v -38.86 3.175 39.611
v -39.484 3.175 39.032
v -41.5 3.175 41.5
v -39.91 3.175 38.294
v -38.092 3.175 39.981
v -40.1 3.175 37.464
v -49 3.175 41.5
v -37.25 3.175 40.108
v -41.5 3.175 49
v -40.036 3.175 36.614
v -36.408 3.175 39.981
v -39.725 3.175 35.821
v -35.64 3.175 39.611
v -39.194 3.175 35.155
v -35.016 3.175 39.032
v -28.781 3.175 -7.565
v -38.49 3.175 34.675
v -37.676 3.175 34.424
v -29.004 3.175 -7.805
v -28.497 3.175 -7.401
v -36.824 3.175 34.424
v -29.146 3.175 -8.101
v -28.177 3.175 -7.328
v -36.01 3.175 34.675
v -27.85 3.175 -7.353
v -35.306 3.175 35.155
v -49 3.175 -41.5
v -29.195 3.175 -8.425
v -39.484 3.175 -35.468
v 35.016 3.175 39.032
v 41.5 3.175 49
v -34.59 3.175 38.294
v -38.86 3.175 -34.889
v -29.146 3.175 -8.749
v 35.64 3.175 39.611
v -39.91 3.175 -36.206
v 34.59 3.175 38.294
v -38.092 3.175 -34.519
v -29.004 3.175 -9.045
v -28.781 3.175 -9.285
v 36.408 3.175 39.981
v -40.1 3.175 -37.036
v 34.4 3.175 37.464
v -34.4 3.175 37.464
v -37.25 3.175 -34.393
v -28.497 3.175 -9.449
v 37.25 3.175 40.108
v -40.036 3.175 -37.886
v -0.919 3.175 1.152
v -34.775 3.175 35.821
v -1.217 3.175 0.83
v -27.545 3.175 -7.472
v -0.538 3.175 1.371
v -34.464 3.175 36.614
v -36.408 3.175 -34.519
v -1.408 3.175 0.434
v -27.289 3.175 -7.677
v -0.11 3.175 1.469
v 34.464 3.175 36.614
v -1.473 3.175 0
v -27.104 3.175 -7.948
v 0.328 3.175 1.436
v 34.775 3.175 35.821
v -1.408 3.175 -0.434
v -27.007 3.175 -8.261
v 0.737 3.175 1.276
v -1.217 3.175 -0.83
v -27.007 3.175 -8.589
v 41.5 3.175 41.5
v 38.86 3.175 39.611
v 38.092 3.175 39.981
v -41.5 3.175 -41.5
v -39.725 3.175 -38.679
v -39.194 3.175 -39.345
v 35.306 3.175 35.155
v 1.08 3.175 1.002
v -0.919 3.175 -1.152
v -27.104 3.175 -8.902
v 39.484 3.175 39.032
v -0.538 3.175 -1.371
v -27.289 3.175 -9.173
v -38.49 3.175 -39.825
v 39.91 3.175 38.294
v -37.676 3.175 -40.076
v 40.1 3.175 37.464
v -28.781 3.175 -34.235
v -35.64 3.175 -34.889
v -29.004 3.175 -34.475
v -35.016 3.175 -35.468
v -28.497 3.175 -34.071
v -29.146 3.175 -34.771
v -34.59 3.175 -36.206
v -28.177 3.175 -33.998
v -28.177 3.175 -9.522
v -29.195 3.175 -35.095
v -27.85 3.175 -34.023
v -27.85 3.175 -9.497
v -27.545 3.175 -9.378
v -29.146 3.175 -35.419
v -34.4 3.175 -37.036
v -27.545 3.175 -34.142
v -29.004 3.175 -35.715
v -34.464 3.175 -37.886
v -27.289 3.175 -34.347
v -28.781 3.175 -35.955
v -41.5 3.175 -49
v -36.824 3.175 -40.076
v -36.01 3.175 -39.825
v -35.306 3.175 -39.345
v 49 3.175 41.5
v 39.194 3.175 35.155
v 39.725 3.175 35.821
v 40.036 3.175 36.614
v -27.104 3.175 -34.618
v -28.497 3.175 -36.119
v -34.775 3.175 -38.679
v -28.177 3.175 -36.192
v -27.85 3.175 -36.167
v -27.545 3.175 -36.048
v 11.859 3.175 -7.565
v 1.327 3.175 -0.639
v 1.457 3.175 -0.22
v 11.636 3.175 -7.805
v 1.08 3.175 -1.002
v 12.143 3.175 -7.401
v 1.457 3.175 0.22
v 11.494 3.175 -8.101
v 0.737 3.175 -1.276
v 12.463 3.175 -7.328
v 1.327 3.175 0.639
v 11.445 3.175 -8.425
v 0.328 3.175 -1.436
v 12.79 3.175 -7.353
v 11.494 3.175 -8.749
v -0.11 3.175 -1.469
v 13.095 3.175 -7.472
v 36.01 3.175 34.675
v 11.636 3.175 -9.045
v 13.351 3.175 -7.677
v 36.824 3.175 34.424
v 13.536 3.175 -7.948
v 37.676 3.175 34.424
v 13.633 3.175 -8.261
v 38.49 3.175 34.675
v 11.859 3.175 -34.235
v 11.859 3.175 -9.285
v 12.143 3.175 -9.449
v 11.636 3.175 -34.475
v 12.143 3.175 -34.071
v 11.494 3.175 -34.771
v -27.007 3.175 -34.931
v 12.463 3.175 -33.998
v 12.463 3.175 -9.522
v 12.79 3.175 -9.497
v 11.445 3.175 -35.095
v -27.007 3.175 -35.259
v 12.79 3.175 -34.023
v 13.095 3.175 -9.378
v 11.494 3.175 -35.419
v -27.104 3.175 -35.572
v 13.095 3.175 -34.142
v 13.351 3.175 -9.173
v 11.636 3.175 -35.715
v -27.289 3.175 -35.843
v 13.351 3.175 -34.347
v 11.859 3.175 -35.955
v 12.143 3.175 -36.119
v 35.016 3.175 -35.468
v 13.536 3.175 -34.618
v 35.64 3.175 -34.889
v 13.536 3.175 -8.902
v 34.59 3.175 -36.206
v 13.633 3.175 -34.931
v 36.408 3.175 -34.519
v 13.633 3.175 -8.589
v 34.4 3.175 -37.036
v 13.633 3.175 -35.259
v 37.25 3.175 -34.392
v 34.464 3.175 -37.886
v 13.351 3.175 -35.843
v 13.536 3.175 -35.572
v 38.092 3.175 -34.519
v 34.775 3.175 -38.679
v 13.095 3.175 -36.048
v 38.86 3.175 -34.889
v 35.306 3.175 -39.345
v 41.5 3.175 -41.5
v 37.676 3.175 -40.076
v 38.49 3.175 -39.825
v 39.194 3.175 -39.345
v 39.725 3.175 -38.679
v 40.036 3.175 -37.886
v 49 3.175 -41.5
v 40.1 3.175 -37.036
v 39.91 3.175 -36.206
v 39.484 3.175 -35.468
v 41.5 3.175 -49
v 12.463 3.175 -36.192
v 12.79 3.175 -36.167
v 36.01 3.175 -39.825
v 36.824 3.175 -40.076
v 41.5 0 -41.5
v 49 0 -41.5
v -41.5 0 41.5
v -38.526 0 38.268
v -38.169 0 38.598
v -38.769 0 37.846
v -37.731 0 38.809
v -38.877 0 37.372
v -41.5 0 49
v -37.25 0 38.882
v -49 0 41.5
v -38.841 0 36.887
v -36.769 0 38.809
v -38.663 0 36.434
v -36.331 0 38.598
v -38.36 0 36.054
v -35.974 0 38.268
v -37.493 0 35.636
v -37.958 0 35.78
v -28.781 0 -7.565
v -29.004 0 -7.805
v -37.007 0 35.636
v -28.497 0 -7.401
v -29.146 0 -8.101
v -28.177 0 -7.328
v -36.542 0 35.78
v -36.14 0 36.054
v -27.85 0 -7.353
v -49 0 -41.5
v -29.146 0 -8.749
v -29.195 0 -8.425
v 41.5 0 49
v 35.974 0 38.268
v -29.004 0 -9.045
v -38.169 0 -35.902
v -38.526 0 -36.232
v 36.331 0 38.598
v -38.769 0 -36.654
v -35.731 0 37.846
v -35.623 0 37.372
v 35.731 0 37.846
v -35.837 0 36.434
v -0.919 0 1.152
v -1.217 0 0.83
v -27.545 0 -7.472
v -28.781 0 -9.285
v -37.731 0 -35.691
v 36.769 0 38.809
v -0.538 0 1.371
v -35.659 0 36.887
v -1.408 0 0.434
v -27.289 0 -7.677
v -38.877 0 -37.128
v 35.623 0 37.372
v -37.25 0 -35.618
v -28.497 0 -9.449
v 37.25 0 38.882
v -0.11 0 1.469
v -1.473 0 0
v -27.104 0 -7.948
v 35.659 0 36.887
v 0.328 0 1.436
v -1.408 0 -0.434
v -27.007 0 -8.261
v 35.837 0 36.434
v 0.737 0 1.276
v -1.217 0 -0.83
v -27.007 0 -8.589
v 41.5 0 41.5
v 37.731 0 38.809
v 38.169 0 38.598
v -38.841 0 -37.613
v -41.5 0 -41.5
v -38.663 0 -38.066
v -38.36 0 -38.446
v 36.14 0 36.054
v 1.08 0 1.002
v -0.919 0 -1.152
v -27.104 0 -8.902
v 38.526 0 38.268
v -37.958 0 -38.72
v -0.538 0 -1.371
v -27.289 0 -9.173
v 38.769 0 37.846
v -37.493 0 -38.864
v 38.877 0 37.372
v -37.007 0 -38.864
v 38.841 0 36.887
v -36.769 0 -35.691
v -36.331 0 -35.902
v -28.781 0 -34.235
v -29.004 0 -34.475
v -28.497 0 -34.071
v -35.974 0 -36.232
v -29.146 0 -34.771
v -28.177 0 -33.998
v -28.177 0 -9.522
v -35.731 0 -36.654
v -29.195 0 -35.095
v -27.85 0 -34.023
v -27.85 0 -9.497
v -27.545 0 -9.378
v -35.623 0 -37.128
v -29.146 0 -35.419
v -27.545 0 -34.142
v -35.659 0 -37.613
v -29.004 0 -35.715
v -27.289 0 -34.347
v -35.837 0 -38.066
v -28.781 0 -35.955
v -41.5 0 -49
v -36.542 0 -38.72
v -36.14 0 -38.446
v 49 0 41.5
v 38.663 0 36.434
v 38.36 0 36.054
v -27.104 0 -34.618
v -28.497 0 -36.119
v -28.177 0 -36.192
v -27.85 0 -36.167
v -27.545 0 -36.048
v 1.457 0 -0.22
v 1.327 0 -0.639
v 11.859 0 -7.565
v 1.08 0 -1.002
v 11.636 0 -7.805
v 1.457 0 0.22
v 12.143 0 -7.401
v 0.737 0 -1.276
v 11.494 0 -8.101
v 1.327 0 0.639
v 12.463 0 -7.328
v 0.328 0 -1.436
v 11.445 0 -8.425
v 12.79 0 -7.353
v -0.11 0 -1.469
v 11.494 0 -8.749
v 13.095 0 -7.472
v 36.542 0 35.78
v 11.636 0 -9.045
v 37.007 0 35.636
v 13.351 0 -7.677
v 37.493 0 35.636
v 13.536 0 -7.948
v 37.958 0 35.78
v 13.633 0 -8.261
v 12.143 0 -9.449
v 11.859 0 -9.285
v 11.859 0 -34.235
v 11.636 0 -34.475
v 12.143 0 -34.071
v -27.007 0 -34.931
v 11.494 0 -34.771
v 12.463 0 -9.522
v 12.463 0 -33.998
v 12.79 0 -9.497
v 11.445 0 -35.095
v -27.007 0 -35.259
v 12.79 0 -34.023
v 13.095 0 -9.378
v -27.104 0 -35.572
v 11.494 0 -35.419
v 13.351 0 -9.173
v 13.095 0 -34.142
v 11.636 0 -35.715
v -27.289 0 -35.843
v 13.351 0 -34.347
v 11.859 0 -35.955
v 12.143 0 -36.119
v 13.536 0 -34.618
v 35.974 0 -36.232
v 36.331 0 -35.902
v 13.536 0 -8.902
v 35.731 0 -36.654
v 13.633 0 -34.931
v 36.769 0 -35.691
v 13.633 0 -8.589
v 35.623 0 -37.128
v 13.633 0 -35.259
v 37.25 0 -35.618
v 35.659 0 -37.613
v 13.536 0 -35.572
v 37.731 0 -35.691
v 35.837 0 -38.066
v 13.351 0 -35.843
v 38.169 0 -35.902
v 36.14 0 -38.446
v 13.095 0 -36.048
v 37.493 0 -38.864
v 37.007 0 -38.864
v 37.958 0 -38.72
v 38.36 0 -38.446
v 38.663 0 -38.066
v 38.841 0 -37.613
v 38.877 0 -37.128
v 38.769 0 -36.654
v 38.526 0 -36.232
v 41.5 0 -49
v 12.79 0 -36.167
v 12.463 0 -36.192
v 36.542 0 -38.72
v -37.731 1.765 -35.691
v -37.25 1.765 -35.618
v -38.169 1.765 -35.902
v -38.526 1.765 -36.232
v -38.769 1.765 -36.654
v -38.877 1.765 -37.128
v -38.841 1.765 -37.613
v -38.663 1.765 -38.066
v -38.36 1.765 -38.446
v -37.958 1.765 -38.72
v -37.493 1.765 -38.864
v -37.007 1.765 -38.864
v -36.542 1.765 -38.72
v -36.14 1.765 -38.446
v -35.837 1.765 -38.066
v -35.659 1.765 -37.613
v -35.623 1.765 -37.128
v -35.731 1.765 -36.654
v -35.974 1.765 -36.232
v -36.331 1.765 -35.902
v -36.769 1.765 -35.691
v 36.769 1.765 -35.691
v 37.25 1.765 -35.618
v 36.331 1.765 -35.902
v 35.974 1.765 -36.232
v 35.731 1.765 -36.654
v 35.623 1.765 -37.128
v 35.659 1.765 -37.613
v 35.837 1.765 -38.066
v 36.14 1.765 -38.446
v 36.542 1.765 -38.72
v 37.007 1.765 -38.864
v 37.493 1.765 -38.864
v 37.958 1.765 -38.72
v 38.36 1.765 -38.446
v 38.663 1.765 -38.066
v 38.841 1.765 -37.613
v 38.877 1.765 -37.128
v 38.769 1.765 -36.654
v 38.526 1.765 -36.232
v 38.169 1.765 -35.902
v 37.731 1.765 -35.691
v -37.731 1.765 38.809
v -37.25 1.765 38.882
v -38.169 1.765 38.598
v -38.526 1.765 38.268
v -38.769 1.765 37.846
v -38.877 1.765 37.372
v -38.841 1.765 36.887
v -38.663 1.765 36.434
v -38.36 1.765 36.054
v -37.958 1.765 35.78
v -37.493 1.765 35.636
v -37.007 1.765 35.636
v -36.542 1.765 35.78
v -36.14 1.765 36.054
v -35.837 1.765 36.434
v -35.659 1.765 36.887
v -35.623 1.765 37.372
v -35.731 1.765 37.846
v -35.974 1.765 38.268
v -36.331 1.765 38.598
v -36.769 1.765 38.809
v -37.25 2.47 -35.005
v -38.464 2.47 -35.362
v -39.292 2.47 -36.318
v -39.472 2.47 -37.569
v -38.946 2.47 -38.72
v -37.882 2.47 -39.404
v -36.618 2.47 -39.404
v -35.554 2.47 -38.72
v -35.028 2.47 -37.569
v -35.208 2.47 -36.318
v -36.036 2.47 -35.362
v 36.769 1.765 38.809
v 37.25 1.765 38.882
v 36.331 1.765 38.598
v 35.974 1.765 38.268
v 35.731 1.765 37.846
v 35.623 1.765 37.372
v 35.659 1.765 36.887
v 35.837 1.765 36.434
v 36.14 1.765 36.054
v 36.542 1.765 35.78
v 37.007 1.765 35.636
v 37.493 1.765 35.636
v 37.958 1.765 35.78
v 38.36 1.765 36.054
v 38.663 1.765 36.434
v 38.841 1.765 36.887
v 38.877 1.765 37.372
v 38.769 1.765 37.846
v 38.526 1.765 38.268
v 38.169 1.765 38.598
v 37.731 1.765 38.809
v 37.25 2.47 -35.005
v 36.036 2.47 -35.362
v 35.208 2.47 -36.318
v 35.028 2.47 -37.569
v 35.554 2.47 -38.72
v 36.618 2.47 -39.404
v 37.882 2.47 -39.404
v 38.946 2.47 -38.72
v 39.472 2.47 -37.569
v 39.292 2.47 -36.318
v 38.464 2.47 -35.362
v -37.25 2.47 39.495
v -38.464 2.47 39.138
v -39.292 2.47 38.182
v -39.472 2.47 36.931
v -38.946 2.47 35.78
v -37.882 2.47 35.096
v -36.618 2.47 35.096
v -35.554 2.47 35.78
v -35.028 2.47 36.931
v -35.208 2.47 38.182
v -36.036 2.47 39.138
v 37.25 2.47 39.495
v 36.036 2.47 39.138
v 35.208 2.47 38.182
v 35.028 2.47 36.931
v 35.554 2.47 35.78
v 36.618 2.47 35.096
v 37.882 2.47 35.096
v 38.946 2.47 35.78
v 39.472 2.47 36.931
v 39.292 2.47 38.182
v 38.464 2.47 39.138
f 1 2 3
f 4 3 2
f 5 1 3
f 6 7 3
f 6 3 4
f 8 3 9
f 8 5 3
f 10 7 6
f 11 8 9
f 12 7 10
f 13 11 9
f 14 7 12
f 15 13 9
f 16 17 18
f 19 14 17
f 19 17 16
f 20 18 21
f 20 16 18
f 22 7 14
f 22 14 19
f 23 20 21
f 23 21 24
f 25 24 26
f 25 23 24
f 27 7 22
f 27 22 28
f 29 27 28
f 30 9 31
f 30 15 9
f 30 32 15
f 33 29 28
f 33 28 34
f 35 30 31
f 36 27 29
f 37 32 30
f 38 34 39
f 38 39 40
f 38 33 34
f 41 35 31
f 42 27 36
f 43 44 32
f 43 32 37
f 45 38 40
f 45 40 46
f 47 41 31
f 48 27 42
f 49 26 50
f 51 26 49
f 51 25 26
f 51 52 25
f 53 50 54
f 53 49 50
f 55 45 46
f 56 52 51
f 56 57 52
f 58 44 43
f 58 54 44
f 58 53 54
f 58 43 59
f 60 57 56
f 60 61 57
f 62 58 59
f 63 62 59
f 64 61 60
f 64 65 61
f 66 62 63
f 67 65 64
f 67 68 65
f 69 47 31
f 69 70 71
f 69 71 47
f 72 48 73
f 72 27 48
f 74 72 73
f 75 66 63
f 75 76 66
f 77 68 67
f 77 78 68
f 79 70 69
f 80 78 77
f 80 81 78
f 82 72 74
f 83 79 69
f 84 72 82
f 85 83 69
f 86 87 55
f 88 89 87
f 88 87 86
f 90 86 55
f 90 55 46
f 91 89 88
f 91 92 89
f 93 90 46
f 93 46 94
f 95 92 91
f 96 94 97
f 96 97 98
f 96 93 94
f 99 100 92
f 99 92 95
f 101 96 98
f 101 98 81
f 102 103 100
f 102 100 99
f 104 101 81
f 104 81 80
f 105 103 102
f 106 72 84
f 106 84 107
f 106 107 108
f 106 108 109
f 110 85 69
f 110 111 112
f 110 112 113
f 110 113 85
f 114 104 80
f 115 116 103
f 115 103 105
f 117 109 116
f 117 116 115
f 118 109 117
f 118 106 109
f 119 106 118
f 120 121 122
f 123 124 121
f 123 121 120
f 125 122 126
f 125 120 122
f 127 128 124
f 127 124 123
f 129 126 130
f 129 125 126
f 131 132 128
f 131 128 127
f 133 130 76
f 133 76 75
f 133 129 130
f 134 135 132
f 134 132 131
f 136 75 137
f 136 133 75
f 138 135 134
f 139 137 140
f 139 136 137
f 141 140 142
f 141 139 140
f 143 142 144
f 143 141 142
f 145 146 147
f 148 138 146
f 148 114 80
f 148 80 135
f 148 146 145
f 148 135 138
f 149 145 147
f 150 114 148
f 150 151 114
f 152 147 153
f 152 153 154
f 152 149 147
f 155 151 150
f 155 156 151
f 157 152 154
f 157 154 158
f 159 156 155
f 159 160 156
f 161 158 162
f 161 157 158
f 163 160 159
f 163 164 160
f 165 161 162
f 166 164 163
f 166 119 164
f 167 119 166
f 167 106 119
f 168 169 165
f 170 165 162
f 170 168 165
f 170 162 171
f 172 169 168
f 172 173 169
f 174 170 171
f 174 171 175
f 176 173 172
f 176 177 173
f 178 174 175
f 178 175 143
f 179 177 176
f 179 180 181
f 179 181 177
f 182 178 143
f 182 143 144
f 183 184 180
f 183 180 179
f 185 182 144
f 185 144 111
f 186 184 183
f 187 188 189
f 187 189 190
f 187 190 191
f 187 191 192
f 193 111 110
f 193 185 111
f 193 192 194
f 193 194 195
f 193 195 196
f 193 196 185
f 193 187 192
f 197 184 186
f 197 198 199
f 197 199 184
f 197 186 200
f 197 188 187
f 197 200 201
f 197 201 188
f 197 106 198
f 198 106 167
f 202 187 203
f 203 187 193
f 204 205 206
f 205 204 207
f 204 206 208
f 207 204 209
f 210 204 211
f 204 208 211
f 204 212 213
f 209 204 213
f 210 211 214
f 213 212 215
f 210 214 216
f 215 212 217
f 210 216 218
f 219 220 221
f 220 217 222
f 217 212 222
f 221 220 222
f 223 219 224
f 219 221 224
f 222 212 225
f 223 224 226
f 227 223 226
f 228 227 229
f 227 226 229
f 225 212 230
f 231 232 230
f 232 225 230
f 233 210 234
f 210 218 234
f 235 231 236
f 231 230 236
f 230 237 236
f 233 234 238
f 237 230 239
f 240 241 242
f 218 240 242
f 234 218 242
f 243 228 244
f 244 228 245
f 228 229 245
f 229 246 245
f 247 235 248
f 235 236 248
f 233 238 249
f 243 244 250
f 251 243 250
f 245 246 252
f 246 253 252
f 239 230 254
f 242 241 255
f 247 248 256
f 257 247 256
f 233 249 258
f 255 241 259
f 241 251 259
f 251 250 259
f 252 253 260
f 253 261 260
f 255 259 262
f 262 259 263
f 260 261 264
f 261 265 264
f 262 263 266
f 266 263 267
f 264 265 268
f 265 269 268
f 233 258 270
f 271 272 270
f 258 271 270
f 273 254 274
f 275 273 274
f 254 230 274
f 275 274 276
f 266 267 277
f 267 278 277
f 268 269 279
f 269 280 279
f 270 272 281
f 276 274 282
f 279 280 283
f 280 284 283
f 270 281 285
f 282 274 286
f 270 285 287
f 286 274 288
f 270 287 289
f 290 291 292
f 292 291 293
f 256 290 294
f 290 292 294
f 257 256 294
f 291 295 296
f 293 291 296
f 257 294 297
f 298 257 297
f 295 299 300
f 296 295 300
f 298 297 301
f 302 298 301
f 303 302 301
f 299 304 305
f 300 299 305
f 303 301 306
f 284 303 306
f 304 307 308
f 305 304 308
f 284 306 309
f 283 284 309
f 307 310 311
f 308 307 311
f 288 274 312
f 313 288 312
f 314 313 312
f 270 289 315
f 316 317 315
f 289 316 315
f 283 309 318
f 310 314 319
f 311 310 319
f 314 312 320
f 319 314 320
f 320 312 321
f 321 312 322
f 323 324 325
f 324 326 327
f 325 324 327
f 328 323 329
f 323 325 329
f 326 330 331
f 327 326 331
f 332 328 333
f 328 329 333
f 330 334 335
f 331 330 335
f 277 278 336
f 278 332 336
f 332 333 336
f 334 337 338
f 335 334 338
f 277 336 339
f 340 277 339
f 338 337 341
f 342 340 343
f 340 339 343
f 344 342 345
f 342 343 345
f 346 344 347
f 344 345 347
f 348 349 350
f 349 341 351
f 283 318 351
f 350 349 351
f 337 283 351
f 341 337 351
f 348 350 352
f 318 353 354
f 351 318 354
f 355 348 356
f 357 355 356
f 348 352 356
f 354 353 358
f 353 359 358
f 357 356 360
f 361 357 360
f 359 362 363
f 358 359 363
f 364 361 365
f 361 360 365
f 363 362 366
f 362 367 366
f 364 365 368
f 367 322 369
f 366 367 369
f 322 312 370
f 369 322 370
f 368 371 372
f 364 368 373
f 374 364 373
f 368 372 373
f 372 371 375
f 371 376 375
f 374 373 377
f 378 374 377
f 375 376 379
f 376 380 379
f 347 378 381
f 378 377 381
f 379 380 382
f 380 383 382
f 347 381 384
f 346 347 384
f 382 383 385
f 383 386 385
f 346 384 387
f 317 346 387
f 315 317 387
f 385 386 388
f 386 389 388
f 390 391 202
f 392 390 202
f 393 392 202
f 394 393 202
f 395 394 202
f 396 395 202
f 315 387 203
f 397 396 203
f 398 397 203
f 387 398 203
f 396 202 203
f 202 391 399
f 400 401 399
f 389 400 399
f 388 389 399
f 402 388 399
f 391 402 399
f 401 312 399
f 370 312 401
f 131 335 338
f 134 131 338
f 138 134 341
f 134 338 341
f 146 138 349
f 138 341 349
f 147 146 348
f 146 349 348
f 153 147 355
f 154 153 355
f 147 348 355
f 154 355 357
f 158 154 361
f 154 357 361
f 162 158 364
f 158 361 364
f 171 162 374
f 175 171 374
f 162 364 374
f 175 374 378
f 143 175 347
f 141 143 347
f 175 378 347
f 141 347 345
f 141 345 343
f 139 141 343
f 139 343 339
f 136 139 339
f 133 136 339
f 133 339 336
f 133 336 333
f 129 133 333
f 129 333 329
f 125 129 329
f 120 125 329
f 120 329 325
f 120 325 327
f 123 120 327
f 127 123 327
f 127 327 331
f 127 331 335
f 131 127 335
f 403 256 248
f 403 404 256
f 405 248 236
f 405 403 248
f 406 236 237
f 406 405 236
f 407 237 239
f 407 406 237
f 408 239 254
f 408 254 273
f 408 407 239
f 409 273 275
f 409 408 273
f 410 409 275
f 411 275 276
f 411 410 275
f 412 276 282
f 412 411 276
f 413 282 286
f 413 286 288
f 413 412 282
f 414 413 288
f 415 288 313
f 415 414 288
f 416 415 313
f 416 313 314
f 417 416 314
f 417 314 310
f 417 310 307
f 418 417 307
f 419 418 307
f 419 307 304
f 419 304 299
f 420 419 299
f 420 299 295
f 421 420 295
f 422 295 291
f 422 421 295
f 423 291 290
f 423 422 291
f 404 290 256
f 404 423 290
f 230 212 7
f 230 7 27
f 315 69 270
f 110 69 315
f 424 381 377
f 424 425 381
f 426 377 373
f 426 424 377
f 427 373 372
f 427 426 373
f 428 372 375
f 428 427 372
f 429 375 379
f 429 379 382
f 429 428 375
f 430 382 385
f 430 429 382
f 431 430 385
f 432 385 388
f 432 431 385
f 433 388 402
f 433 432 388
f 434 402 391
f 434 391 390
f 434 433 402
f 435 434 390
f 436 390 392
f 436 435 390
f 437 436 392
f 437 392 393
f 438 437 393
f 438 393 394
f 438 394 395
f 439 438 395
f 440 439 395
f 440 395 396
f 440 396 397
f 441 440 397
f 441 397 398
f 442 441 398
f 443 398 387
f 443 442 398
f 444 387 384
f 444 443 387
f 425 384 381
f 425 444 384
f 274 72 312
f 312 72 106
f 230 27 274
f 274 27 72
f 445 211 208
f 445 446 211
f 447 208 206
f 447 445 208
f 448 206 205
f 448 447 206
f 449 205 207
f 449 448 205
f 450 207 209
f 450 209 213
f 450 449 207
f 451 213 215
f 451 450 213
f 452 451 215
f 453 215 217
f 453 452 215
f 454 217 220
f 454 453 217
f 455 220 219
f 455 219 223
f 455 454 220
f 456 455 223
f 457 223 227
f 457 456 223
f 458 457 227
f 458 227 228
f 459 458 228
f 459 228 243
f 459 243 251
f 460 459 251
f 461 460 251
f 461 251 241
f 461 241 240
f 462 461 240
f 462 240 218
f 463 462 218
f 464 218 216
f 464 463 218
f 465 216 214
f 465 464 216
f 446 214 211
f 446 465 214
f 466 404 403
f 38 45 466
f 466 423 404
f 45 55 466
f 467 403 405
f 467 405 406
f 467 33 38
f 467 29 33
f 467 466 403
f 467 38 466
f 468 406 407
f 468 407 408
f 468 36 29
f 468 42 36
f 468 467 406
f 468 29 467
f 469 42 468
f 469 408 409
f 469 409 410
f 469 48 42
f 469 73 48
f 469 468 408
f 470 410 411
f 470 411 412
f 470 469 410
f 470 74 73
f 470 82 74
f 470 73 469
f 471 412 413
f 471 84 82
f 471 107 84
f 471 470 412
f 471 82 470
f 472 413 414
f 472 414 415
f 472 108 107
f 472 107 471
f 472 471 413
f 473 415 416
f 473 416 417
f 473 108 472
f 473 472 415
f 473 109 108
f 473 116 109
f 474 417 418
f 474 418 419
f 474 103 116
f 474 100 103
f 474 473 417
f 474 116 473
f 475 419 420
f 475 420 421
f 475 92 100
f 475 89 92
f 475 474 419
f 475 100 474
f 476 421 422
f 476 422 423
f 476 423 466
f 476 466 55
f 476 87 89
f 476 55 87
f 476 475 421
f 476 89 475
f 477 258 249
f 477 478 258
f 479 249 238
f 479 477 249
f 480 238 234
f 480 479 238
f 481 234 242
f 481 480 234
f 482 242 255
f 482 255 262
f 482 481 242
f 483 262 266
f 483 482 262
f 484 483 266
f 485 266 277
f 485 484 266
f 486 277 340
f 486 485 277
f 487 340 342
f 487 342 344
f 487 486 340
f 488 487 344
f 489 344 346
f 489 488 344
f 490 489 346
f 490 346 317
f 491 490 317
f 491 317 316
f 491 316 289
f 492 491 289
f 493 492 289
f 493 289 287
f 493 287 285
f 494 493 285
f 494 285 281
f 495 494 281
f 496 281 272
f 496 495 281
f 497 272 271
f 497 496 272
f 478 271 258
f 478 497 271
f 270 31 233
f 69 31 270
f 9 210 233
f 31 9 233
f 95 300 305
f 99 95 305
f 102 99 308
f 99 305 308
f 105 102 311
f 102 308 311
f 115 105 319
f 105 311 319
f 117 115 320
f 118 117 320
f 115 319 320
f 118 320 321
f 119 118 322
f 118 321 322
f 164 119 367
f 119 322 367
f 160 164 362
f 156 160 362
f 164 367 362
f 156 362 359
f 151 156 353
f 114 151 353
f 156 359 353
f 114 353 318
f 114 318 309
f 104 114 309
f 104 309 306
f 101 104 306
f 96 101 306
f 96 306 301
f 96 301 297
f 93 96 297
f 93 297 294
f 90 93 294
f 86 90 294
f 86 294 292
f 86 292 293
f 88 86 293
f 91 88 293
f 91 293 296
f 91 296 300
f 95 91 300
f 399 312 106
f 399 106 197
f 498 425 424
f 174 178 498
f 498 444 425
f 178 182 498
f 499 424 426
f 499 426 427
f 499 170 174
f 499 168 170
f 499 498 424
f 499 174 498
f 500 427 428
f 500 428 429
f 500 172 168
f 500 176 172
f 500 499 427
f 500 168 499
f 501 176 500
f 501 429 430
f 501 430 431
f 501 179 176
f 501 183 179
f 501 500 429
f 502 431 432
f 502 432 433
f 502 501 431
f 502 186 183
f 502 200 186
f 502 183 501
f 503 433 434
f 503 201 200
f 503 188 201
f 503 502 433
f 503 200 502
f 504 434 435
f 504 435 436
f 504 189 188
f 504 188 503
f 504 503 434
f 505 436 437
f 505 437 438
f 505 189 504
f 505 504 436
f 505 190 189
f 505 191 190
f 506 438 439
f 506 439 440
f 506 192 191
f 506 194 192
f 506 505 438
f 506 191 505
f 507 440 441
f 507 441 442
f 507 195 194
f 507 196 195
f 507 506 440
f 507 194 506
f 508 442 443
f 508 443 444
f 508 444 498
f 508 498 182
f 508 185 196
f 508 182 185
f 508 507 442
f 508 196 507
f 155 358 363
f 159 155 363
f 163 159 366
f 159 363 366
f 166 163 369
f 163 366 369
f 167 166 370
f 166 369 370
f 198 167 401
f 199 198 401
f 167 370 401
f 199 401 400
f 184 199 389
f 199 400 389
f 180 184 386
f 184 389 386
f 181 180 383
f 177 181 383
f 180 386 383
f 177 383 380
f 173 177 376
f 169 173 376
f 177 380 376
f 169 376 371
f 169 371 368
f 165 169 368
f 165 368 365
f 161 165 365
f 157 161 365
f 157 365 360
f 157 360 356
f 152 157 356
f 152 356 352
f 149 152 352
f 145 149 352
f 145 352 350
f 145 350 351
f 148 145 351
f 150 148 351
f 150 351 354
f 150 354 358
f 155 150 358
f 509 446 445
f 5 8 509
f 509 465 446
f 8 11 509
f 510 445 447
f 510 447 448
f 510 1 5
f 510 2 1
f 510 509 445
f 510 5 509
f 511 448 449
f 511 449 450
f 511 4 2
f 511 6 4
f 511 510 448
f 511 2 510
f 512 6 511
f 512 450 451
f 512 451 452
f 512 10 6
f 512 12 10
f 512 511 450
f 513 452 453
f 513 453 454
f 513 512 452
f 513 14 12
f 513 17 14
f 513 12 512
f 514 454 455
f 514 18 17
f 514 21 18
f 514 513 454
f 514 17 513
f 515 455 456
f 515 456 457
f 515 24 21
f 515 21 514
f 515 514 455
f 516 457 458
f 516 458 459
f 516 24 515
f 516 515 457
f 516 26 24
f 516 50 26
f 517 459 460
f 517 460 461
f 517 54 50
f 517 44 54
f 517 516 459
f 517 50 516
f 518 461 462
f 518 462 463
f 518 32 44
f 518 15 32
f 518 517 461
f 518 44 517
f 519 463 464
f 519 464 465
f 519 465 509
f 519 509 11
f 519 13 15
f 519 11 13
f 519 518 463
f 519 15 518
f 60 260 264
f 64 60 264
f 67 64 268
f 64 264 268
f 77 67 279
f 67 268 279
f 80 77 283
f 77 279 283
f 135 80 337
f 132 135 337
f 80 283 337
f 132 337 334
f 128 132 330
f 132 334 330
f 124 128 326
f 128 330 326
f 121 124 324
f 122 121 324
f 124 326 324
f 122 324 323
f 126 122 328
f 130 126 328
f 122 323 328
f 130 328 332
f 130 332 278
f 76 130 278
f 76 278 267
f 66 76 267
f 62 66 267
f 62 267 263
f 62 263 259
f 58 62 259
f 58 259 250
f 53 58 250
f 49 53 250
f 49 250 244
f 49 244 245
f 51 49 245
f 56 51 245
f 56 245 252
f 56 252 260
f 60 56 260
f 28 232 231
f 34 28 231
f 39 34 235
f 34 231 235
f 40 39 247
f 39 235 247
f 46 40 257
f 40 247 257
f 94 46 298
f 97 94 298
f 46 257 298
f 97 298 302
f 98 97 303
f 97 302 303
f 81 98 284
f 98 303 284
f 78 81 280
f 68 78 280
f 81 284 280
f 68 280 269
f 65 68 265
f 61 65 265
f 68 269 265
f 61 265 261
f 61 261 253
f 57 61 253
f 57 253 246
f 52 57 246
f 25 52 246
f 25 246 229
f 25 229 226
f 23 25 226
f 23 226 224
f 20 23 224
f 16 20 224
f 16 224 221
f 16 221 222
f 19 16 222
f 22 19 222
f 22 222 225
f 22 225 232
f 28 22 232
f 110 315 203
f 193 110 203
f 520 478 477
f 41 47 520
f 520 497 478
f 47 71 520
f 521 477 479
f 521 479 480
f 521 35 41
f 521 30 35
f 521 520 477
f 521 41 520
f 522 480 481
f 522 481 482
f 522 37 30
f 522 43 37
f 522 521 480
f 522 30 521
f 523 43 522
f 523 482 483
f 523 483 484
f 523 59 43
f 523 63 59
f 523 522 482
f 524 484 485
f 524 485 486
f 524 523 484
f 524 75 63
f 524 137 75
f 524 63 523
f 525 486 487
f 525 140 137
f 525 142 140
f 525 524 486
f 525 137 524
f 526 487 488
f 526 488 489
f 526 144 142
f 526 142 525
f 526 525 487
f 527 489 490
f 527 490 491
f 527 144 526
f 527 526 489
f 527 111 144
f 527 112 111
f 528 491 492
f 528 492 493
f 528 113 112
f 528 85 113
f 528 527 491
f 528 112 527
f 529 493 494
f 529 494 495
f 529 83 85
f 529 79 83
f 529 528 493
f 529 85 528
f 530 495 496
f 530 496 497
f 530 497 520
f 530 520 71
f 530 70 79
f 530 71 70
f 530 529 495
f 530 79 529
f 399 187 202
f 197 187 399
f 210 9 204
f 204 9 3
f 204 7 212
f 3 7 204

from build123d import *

# Parameters (mm, degrees)
SKETCH1_W                                     = 98
SKETCH1_H                                     = 98
BOSS_EXTRUDE1_DEPTH                           = 3.175
SKETCH2_W                                     = 7.5
SKETCH2_H                                     = 7.5
CUT_EXTRUDE1_DEPTH                            = 70.369161917
F_4_CLEARANCE_HOLE1_D                         = 2.9464
M2_CLEARANCE_HOLE1_D                          = 2.2
CSK_FOR_4_FLAT_HEAD_MACHINE_SCREW1_AT_2_COUNT = 2
CSK_FOR_4_FLAT_HEAD_MACHINE_SCREW1_AT_2_PITCH = 74.5
CSK_FOR_4_FLAT_HEAD_MACHINE_SCREW1_AT_3_COUNT = 2
CSK_FOR_4_FLAT_HEAD_MACHINE_SCREW1_AT_3_PITCH = 105.358910397
CSK_FOR_4_FLAT_HEAD_MACHINE_SCREW1_AT_4_COUNT = 2
CSK_FOR_4_FLAT_HEAD_MACHINE_SCREW1_AT_4_PITCH = 74.5


with BuildPart() as part:
    # Sketch1 → Boss-Extrude1 (new body)
    with BuildSketch(Plane(origin=(0, 0, 0), x_dir=(1, 0, 0), z_dir=(0, 1, 0))):
        Rectangle(SKETCH1_W, SKETCH1_H)
    extrude(amount=BOSS_EXTRUDE1_DEPTH)

    # Sketch2 → Cut-Extrude1 (cut, through all)
    with BuildSketch(Plane(origin=(0, 3.175, 0), x_dir=(1, 0, 0), z_dir=(0, 1, 0))):
        with Locations((45.25, 45.25)):
            Rectangle(SKETCH2_W, SKETCH2_H)
        with Locations((-45.25, 45.25)):
            Rectangle(SKETCH2_W, SKETCH2_H)
        with Locations((45.25, -45.25)):
            Rectangle(SKETCH2_W, SKETCH2_H)
        with Locations((-45.25, -45.25)):
            Rectangle(SKETCH2_W, SKETCH2_H)
    extrude(amount=-CUT_EXTRUDE1_DEPTH, mode=Mode.SUBTRACT)

    # #4 Clearance Hole1 (through all)
    with Locations(Plane(origin=(0, 3.175, 0), x_dir=(1, 0, 0), z_dir=(0, 1, 0))):
        with Locations((0, 0)):
            Hole(F_4_CLEARANCE_HOLE1_D / 2)

    # M2 Clearance Hole1 (through all)
    with Locations(Plane(origin=(0, 3.175, 0), x_dir=(1, 0, 0), z_dir=(0, 1, 0))):
        with Locations((-28.095, 35.095), (12.545, 35.095), (12.545, 8.425), (-28.095, 8.425)):
            Hole(M2_CLEARANCE_HOLE1_D / 2)

    # Sketch9 → CSK for #4 Flat Head Machine Screw1 (revolve, cut)
    with BuildSketch(Plane(origin=(37.25, 3.175, 37.25), x_dir=(0, 0, 1), z_dir=(1, 0, 0))):
        Polygon((0, 0), (0, 3.175), (1.63195, 3.175), (1.63195, 1.409834001), (2.8575, 0), align=None)
    csk_for_4_flat_head_machine_screw1 = revolve(axis=Axis((37.25, 9.525, 37.25), (0, -1, 0)), mode=Mode.SUBTRACT)

    # CSK for #4 Flat Head Machine Screw1 at 2: CSK for #4 Flat Head Machine Screw1 ×2
    with Locations(*[(-i * CSK_FOR_4_FLAT_HEAD_MACHINE_SCREW1_AT_2_PITCH, 0, 0) for i in range(1, CSK_FOR_4_FLAT_HEAD_MACHINE_SCREW1_AT_2_COUNT)]):
        add(csk_for_4_flat_head_machine_screw1, mode=Mode.SUBTRACT)

    # CSK for #4 Flat Head Machine Screw1 at 3: CSK for #4 Flat Head Machine Screw1 ×2
    with Locations(*[Vector(-0.7071067811865502, 0, -0.7071067811865448) * (i * CSK_FOR_4_FLAT_HEAD_MACHINE_SCREW1_AT_3_PITCH) for i in range(1, CSK_FOR_4_FLAT_HEAD_MACHINE_SCREW1_AT_3_COUNT)]):
        add(csk_for_4_flat_head_machine_screw1, mode=Mode.SUBTRACT)

    # CSK for #4 Flat Head Machine Screw1 at 4: CSK for #4 Flat Head Machine Screw1 ×2
    with Locations(*[(0, 0, -i * CSK_FOR_4_FLAT_HEAD_MACHINE_SCREW1_AT_4_PITCH) for i in range(1, CSK_FOR_4_FLAT_HEAD_MACHINE_SCREW1_AT_4_COUNT)]):
        add(csk_for_4_flat_head_machine_screw1, mode=Mode.SUBTRACT)


solid = part.part
